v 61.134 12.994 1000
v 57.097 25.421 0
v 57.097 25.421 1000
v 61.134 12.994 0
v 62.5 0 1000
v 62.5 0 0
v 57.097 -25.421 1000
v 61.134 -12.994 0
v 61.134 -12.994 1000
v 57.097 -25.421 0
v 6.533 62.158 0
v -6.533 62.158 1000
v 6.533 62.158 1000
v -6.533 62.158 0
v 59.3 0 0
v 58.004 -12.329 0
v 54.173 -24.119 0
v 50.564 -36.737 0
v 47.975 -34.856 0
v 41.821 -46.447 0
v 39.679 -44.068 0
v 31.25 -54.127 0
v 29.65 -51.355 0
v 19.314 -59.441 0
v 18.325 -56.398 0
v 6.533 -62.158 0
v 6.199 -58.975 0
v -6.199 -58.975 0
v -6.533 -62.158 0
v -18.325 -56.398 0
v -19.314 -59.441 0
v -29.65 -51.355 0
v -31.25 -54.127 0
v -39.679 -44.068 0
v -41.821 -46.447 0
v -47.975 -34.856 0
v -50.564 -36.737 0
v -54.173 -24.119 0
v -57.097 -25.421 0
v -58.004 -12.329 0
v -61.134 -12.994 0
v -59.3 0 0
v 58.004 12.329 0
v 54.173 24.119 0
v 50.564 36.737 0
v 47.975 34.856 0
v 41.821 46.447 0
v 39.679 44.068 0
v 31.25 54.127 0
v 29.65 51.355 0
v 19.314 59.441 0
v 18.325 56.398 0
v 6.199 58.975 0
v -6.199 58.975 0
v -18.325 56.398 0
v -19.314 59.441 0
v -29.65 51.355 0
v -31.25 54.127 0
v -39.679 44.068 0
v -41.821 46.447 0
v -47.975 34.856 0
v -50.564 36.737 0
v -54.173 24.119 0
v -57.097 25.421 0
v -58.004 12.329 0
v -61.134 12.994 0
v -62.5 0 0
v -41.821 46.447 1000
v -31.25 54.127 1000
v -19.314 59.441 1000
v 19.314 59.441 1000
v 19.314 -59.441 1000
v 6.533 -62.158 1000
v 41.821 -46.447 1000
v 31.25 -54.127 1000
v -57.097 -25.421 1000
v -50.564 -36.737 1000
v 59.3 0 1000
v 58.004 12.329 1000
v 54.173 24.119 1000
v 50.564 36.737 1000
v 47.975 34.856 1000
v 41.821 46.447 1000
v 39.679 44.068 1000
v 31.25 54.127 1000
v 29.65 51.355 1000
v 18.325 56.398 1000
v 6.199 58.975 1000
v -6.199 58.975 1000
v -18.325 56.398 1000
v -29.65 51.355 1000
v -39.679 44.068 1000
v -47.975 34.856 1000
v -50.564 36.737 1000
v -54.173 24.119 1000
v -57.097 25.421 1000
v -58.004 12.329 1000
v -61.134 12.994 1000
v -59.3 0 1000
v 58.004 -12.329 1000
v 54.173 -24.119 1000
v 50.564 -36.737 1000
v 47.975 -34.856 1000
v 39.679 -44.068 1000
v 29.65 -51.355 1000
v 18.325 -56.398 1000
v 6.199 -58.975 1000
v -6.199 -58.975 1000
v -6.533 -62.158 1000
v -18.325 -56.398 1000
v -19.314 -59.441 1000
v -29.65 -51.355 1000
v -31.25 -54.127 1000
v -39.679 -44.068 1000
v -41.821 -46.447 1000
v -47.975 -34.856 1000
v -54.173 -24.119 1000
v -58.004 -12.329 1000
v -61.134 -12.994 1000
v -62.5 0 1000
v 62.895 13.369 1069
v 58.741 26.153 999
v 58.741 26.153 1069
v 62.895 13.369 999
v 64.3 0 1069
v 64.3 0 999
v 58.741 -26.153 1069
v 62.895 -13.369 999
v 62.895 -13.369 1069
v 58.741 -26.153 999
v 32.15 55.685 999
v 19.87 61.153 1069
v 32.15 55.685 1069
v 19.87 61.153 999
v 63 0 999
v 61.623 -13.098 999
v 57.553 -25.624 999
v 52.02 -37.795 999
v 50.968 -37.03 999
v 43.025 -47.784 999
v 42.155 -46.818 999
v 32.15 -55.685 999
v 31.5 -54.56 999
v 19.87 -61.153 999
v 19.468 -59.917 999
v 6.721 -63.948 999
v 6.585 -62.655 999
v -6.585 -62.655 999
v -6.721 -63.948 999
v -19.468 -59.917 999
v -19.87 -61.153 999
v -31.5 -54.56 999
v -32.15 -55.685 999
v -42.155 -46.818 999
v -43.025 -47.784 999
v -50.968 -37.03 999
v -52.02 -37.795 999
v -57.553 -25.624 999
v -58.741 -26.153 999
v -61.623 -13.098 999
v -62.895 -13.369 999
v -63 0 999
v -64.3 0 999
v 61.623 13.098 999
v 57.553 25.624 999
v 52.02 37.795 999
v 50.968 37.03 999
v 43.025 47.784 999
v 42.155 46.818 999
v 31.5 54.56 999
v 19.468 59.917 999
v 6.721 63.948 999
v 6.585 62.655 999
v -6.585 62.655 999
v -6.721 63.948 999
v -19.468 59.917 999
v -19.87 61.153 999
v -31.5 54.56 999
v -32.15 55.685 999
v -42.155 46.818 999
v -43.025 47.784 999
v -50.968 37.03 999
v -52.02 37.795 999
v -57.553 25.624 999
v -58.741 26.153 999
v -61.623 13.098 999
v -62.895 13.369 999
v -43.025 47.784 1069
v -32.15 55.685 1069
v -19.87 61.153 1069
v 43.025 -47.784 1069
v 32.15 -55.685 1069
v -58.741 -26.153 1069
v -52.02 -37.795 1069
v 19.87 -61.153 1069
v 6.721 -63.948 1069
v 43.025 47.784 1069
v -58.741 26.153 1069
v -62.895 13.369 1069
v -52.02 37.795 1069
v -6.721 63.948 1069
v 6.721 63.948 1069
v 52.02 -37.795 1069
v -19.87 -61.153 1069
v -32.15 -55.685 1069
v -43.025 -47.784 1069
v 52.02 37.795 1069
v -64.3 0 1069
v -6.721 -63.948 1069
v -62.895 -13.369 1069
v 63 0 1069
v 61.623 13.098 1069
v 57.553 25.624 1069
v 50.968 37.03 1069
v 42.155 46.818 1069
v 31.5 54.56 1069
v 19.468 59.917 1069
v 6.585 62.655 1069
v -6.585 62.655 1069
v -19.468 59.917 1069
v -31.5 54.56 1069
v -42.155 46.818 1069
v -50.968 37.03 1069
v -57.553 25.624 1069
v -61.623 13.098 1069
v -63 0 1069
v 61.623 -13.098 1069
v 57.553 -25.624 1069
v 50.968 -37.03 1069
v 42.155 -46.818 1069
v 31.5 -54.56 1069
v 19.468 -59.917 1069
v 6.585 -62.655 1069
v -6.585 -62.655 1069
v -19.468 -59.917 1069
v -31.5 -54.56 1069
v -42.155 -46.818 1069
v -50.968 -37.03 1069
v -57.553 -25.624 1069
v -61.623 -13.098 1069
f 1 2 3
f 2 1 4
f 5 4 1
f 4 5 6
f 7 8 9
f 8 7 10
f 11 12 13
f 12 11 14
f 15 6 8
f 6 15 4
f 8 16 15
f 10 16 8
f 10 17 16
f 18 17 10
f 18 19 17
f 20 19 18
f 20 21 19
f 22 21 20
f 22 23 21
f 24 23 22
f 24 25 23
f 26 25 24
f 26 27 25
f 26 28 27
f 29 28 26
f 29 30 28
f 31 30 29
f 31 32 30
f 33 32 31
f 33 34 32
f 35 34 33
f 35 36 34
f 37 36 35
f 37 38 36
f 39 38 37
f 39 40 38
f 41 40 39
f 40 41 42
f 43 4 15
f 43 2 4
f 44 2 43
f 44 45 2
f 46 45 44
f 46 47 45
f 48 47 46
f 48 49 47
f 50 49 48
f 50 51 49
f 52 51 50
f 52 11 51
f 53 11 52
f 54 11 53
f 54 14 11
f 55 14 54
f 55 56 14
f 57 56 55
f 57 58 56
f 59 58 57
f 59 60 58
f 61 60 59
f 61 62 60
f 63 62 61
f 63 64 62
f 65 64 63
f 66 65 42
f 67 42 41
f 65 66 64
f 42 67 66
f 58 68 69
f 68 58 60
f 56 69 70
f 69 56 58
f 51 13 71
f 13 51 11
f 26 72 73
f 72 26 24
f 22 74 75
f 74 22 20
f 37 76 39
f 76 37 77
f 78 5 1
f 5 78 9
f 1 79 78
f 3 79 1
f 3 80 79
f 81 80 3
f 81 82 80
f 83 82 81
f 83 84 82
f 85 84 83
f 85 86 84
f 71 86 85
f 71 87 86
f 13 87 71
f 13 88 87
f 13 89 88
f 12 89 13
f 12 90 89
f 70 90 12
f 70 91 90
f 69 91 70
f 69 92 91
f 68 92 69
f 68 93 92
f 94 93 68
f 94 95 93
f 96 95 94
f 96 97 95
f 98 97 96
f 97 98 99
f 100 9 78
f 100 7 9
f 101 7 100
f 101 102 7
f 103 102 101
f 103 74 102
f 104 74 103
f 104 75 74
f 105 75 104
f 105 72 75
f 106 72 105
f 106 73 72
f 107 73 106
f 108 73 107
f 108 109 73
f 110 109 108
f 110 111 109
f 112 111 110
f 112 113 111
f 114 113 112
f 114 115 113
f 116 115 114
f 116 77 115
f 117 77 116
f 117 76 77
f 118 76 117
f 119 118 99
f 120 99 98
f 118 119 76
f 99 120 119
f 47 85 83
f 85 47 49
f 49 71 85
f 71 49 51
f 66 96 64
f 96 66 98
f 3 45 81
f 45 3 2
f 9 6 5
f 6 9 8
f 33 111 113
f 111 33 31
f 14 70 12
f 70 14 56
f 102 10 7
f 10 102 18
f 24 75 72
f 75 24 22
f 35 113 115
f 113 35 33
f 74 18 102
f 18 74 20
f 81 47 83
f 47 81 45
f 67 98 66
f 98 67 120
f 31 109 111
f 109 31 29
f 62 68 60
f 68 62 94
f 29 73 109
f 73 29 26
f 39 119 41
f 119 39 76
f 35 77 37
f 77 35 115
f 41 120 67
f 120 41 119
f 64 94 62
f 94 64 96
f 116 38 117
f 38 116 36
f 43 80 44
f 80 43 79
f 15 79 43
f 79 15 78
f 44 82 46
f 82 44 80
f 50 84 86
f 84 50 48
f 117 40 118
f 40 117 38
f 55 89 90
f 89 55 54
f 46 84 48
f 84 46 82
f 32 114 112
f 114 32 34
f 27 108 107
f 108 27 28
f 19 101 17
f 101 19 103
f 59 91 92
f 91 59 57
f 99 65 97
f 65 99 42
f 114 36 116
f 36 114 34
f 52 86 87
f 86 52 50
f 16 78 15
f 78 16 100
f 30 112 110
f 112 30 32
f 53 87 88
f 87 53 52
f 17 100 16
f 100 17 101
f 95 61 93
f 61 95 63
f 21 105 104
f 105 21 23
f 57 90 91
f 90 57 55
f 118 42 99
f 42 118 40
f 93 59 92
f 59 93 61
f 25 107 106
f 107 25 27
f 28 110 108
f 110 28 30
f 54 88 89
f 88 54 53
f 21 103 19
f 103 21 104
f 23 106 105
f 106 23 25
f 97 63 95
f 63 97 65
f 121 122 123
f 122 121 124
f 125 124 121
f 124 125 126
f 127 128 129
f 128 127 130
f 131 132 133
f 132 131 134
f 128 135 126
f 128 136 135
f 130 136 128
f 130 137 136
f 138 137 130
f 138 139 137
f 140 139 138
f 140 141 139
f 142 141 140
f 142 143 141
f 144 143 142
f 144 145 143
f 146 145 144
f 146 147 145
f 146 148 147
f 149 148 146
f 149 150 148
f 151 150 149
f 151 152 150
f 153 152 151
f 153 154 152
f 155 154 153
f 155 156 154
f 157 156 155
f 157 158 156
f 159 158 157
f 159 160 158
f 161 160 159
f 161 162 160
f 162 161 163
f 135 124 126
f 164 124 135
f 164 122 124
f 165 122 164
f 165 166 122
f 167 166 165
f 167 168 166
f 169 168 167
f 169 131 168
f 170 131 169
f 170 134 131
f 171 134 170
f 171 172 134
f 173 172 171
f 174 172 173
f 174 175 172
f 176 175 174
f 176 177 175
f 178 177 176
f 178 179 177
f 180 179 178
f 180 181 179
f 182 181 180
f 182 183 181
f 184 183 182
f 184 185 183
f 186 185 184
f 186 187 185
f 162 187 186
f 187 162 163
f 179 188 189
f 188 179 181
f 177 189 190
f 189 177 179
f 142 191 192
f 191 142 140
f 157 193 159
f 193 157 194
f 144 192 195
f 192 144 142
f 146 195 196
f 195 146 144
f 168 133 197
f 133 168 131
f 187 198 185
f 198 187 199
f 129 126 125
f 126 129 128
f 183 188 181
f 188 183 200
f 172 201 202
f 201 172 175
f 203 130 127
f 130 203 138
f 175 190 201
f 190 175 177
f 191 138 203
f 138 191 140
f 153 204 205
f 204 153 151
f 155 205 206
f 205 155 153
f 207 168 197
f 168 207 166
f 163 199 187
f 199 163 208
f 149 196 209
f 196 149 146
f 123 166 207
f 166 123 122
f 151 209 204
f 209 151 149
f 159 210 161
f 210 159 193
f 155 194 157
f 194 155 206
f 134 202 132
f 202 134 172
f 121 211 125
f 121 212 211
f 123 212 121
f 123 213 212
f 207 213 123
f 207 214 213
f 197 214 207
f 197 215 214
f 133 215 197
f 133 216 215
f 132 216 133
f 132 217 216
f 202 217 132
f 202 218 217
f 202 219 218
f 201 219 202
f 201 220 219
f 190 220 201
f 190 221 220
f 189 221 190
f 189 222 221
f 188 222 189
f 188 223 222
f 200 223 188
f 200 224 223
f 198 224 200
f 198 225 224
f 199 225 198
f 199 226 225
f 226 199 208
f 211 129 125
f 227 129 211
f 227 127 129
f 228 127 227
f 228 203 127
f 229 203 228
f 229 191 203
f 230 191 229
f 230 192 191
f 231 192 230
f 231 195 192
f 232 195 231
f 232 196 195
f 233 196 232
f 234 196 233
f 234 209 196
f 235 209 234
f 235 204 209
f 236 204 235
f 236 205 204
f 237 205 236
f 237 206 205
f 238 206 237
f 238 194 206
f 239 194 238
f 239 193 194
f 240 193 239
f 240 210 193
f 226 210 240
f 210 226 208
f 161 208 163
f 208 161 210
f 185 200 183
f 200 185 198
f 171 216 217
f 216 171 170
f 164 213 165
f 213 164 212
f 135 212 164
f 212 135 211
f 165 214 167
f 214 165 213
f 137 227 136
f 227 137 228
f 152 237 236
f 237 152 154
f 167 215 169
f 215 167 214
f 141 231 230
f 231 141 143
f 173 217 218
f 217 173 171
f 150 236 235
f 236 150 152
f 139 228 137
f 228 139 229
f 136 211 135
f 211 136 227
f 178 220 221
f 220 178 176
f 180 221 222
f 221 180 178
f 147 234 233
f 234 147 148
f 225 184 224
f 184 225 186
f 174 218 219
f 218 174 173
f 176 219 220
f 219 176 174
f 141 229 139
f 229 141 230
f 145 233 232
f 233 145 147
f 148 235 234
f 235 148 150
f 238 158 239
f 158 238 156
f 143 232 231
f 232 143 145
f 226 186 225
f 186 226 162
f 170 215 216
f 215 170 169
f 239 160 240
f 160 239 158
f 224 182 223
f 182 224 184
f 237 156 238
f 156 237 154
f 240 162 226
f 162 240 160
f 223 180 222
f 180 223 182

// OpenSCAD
// Parameters
pipe_standard = 1; //[1:1:1]
nominal_diameter = 125; //[63:250:1]
length_mm = 1000; //[200:2000:10]
pipe_od = 125; //[63:250:1]
pipe_wall = 3.2; //[2:6.5:0.1]
fit_length = 70; //[40:140:1]
fit_wall_extra = 1.8; //[0.8:4:0.1]
fit_id_clearance = 1.0; //[0.2:2.5:0.1]
overlap = 1.0; //[0.5:2.0:0.1]

// Module for the HT Pipe
module ht_pipe() {
  color([0.85, 0.85, 0.8]) { // PVC color
    union() {
      // Pipe body
      difference() {
        cylinder(h=length_mm, r=pipe_od/2, center=false);
        translate([0, 0, -overlap])
          cylinder(h=length_mm + 2*overlap, r=pipe_od/2 - pipe_wall, center=false);
      }
      
      // End fitting
      difference() {
        translate([0, 0, length_mm - overlap])
          cylinder(h=fit_length, r=pipe_od/2 + fit_wall_extra, center=false);
        translate([0, 0, length_mm - overlap - overlap])
          cylinder(h=fit_length + 2*overlap, r=(pipe_od + fit_id_clearance)/2, center=false);
      }
    }
  }
}

// Assembly
module assembly() {
  ht_pipe();
}

assembly();
